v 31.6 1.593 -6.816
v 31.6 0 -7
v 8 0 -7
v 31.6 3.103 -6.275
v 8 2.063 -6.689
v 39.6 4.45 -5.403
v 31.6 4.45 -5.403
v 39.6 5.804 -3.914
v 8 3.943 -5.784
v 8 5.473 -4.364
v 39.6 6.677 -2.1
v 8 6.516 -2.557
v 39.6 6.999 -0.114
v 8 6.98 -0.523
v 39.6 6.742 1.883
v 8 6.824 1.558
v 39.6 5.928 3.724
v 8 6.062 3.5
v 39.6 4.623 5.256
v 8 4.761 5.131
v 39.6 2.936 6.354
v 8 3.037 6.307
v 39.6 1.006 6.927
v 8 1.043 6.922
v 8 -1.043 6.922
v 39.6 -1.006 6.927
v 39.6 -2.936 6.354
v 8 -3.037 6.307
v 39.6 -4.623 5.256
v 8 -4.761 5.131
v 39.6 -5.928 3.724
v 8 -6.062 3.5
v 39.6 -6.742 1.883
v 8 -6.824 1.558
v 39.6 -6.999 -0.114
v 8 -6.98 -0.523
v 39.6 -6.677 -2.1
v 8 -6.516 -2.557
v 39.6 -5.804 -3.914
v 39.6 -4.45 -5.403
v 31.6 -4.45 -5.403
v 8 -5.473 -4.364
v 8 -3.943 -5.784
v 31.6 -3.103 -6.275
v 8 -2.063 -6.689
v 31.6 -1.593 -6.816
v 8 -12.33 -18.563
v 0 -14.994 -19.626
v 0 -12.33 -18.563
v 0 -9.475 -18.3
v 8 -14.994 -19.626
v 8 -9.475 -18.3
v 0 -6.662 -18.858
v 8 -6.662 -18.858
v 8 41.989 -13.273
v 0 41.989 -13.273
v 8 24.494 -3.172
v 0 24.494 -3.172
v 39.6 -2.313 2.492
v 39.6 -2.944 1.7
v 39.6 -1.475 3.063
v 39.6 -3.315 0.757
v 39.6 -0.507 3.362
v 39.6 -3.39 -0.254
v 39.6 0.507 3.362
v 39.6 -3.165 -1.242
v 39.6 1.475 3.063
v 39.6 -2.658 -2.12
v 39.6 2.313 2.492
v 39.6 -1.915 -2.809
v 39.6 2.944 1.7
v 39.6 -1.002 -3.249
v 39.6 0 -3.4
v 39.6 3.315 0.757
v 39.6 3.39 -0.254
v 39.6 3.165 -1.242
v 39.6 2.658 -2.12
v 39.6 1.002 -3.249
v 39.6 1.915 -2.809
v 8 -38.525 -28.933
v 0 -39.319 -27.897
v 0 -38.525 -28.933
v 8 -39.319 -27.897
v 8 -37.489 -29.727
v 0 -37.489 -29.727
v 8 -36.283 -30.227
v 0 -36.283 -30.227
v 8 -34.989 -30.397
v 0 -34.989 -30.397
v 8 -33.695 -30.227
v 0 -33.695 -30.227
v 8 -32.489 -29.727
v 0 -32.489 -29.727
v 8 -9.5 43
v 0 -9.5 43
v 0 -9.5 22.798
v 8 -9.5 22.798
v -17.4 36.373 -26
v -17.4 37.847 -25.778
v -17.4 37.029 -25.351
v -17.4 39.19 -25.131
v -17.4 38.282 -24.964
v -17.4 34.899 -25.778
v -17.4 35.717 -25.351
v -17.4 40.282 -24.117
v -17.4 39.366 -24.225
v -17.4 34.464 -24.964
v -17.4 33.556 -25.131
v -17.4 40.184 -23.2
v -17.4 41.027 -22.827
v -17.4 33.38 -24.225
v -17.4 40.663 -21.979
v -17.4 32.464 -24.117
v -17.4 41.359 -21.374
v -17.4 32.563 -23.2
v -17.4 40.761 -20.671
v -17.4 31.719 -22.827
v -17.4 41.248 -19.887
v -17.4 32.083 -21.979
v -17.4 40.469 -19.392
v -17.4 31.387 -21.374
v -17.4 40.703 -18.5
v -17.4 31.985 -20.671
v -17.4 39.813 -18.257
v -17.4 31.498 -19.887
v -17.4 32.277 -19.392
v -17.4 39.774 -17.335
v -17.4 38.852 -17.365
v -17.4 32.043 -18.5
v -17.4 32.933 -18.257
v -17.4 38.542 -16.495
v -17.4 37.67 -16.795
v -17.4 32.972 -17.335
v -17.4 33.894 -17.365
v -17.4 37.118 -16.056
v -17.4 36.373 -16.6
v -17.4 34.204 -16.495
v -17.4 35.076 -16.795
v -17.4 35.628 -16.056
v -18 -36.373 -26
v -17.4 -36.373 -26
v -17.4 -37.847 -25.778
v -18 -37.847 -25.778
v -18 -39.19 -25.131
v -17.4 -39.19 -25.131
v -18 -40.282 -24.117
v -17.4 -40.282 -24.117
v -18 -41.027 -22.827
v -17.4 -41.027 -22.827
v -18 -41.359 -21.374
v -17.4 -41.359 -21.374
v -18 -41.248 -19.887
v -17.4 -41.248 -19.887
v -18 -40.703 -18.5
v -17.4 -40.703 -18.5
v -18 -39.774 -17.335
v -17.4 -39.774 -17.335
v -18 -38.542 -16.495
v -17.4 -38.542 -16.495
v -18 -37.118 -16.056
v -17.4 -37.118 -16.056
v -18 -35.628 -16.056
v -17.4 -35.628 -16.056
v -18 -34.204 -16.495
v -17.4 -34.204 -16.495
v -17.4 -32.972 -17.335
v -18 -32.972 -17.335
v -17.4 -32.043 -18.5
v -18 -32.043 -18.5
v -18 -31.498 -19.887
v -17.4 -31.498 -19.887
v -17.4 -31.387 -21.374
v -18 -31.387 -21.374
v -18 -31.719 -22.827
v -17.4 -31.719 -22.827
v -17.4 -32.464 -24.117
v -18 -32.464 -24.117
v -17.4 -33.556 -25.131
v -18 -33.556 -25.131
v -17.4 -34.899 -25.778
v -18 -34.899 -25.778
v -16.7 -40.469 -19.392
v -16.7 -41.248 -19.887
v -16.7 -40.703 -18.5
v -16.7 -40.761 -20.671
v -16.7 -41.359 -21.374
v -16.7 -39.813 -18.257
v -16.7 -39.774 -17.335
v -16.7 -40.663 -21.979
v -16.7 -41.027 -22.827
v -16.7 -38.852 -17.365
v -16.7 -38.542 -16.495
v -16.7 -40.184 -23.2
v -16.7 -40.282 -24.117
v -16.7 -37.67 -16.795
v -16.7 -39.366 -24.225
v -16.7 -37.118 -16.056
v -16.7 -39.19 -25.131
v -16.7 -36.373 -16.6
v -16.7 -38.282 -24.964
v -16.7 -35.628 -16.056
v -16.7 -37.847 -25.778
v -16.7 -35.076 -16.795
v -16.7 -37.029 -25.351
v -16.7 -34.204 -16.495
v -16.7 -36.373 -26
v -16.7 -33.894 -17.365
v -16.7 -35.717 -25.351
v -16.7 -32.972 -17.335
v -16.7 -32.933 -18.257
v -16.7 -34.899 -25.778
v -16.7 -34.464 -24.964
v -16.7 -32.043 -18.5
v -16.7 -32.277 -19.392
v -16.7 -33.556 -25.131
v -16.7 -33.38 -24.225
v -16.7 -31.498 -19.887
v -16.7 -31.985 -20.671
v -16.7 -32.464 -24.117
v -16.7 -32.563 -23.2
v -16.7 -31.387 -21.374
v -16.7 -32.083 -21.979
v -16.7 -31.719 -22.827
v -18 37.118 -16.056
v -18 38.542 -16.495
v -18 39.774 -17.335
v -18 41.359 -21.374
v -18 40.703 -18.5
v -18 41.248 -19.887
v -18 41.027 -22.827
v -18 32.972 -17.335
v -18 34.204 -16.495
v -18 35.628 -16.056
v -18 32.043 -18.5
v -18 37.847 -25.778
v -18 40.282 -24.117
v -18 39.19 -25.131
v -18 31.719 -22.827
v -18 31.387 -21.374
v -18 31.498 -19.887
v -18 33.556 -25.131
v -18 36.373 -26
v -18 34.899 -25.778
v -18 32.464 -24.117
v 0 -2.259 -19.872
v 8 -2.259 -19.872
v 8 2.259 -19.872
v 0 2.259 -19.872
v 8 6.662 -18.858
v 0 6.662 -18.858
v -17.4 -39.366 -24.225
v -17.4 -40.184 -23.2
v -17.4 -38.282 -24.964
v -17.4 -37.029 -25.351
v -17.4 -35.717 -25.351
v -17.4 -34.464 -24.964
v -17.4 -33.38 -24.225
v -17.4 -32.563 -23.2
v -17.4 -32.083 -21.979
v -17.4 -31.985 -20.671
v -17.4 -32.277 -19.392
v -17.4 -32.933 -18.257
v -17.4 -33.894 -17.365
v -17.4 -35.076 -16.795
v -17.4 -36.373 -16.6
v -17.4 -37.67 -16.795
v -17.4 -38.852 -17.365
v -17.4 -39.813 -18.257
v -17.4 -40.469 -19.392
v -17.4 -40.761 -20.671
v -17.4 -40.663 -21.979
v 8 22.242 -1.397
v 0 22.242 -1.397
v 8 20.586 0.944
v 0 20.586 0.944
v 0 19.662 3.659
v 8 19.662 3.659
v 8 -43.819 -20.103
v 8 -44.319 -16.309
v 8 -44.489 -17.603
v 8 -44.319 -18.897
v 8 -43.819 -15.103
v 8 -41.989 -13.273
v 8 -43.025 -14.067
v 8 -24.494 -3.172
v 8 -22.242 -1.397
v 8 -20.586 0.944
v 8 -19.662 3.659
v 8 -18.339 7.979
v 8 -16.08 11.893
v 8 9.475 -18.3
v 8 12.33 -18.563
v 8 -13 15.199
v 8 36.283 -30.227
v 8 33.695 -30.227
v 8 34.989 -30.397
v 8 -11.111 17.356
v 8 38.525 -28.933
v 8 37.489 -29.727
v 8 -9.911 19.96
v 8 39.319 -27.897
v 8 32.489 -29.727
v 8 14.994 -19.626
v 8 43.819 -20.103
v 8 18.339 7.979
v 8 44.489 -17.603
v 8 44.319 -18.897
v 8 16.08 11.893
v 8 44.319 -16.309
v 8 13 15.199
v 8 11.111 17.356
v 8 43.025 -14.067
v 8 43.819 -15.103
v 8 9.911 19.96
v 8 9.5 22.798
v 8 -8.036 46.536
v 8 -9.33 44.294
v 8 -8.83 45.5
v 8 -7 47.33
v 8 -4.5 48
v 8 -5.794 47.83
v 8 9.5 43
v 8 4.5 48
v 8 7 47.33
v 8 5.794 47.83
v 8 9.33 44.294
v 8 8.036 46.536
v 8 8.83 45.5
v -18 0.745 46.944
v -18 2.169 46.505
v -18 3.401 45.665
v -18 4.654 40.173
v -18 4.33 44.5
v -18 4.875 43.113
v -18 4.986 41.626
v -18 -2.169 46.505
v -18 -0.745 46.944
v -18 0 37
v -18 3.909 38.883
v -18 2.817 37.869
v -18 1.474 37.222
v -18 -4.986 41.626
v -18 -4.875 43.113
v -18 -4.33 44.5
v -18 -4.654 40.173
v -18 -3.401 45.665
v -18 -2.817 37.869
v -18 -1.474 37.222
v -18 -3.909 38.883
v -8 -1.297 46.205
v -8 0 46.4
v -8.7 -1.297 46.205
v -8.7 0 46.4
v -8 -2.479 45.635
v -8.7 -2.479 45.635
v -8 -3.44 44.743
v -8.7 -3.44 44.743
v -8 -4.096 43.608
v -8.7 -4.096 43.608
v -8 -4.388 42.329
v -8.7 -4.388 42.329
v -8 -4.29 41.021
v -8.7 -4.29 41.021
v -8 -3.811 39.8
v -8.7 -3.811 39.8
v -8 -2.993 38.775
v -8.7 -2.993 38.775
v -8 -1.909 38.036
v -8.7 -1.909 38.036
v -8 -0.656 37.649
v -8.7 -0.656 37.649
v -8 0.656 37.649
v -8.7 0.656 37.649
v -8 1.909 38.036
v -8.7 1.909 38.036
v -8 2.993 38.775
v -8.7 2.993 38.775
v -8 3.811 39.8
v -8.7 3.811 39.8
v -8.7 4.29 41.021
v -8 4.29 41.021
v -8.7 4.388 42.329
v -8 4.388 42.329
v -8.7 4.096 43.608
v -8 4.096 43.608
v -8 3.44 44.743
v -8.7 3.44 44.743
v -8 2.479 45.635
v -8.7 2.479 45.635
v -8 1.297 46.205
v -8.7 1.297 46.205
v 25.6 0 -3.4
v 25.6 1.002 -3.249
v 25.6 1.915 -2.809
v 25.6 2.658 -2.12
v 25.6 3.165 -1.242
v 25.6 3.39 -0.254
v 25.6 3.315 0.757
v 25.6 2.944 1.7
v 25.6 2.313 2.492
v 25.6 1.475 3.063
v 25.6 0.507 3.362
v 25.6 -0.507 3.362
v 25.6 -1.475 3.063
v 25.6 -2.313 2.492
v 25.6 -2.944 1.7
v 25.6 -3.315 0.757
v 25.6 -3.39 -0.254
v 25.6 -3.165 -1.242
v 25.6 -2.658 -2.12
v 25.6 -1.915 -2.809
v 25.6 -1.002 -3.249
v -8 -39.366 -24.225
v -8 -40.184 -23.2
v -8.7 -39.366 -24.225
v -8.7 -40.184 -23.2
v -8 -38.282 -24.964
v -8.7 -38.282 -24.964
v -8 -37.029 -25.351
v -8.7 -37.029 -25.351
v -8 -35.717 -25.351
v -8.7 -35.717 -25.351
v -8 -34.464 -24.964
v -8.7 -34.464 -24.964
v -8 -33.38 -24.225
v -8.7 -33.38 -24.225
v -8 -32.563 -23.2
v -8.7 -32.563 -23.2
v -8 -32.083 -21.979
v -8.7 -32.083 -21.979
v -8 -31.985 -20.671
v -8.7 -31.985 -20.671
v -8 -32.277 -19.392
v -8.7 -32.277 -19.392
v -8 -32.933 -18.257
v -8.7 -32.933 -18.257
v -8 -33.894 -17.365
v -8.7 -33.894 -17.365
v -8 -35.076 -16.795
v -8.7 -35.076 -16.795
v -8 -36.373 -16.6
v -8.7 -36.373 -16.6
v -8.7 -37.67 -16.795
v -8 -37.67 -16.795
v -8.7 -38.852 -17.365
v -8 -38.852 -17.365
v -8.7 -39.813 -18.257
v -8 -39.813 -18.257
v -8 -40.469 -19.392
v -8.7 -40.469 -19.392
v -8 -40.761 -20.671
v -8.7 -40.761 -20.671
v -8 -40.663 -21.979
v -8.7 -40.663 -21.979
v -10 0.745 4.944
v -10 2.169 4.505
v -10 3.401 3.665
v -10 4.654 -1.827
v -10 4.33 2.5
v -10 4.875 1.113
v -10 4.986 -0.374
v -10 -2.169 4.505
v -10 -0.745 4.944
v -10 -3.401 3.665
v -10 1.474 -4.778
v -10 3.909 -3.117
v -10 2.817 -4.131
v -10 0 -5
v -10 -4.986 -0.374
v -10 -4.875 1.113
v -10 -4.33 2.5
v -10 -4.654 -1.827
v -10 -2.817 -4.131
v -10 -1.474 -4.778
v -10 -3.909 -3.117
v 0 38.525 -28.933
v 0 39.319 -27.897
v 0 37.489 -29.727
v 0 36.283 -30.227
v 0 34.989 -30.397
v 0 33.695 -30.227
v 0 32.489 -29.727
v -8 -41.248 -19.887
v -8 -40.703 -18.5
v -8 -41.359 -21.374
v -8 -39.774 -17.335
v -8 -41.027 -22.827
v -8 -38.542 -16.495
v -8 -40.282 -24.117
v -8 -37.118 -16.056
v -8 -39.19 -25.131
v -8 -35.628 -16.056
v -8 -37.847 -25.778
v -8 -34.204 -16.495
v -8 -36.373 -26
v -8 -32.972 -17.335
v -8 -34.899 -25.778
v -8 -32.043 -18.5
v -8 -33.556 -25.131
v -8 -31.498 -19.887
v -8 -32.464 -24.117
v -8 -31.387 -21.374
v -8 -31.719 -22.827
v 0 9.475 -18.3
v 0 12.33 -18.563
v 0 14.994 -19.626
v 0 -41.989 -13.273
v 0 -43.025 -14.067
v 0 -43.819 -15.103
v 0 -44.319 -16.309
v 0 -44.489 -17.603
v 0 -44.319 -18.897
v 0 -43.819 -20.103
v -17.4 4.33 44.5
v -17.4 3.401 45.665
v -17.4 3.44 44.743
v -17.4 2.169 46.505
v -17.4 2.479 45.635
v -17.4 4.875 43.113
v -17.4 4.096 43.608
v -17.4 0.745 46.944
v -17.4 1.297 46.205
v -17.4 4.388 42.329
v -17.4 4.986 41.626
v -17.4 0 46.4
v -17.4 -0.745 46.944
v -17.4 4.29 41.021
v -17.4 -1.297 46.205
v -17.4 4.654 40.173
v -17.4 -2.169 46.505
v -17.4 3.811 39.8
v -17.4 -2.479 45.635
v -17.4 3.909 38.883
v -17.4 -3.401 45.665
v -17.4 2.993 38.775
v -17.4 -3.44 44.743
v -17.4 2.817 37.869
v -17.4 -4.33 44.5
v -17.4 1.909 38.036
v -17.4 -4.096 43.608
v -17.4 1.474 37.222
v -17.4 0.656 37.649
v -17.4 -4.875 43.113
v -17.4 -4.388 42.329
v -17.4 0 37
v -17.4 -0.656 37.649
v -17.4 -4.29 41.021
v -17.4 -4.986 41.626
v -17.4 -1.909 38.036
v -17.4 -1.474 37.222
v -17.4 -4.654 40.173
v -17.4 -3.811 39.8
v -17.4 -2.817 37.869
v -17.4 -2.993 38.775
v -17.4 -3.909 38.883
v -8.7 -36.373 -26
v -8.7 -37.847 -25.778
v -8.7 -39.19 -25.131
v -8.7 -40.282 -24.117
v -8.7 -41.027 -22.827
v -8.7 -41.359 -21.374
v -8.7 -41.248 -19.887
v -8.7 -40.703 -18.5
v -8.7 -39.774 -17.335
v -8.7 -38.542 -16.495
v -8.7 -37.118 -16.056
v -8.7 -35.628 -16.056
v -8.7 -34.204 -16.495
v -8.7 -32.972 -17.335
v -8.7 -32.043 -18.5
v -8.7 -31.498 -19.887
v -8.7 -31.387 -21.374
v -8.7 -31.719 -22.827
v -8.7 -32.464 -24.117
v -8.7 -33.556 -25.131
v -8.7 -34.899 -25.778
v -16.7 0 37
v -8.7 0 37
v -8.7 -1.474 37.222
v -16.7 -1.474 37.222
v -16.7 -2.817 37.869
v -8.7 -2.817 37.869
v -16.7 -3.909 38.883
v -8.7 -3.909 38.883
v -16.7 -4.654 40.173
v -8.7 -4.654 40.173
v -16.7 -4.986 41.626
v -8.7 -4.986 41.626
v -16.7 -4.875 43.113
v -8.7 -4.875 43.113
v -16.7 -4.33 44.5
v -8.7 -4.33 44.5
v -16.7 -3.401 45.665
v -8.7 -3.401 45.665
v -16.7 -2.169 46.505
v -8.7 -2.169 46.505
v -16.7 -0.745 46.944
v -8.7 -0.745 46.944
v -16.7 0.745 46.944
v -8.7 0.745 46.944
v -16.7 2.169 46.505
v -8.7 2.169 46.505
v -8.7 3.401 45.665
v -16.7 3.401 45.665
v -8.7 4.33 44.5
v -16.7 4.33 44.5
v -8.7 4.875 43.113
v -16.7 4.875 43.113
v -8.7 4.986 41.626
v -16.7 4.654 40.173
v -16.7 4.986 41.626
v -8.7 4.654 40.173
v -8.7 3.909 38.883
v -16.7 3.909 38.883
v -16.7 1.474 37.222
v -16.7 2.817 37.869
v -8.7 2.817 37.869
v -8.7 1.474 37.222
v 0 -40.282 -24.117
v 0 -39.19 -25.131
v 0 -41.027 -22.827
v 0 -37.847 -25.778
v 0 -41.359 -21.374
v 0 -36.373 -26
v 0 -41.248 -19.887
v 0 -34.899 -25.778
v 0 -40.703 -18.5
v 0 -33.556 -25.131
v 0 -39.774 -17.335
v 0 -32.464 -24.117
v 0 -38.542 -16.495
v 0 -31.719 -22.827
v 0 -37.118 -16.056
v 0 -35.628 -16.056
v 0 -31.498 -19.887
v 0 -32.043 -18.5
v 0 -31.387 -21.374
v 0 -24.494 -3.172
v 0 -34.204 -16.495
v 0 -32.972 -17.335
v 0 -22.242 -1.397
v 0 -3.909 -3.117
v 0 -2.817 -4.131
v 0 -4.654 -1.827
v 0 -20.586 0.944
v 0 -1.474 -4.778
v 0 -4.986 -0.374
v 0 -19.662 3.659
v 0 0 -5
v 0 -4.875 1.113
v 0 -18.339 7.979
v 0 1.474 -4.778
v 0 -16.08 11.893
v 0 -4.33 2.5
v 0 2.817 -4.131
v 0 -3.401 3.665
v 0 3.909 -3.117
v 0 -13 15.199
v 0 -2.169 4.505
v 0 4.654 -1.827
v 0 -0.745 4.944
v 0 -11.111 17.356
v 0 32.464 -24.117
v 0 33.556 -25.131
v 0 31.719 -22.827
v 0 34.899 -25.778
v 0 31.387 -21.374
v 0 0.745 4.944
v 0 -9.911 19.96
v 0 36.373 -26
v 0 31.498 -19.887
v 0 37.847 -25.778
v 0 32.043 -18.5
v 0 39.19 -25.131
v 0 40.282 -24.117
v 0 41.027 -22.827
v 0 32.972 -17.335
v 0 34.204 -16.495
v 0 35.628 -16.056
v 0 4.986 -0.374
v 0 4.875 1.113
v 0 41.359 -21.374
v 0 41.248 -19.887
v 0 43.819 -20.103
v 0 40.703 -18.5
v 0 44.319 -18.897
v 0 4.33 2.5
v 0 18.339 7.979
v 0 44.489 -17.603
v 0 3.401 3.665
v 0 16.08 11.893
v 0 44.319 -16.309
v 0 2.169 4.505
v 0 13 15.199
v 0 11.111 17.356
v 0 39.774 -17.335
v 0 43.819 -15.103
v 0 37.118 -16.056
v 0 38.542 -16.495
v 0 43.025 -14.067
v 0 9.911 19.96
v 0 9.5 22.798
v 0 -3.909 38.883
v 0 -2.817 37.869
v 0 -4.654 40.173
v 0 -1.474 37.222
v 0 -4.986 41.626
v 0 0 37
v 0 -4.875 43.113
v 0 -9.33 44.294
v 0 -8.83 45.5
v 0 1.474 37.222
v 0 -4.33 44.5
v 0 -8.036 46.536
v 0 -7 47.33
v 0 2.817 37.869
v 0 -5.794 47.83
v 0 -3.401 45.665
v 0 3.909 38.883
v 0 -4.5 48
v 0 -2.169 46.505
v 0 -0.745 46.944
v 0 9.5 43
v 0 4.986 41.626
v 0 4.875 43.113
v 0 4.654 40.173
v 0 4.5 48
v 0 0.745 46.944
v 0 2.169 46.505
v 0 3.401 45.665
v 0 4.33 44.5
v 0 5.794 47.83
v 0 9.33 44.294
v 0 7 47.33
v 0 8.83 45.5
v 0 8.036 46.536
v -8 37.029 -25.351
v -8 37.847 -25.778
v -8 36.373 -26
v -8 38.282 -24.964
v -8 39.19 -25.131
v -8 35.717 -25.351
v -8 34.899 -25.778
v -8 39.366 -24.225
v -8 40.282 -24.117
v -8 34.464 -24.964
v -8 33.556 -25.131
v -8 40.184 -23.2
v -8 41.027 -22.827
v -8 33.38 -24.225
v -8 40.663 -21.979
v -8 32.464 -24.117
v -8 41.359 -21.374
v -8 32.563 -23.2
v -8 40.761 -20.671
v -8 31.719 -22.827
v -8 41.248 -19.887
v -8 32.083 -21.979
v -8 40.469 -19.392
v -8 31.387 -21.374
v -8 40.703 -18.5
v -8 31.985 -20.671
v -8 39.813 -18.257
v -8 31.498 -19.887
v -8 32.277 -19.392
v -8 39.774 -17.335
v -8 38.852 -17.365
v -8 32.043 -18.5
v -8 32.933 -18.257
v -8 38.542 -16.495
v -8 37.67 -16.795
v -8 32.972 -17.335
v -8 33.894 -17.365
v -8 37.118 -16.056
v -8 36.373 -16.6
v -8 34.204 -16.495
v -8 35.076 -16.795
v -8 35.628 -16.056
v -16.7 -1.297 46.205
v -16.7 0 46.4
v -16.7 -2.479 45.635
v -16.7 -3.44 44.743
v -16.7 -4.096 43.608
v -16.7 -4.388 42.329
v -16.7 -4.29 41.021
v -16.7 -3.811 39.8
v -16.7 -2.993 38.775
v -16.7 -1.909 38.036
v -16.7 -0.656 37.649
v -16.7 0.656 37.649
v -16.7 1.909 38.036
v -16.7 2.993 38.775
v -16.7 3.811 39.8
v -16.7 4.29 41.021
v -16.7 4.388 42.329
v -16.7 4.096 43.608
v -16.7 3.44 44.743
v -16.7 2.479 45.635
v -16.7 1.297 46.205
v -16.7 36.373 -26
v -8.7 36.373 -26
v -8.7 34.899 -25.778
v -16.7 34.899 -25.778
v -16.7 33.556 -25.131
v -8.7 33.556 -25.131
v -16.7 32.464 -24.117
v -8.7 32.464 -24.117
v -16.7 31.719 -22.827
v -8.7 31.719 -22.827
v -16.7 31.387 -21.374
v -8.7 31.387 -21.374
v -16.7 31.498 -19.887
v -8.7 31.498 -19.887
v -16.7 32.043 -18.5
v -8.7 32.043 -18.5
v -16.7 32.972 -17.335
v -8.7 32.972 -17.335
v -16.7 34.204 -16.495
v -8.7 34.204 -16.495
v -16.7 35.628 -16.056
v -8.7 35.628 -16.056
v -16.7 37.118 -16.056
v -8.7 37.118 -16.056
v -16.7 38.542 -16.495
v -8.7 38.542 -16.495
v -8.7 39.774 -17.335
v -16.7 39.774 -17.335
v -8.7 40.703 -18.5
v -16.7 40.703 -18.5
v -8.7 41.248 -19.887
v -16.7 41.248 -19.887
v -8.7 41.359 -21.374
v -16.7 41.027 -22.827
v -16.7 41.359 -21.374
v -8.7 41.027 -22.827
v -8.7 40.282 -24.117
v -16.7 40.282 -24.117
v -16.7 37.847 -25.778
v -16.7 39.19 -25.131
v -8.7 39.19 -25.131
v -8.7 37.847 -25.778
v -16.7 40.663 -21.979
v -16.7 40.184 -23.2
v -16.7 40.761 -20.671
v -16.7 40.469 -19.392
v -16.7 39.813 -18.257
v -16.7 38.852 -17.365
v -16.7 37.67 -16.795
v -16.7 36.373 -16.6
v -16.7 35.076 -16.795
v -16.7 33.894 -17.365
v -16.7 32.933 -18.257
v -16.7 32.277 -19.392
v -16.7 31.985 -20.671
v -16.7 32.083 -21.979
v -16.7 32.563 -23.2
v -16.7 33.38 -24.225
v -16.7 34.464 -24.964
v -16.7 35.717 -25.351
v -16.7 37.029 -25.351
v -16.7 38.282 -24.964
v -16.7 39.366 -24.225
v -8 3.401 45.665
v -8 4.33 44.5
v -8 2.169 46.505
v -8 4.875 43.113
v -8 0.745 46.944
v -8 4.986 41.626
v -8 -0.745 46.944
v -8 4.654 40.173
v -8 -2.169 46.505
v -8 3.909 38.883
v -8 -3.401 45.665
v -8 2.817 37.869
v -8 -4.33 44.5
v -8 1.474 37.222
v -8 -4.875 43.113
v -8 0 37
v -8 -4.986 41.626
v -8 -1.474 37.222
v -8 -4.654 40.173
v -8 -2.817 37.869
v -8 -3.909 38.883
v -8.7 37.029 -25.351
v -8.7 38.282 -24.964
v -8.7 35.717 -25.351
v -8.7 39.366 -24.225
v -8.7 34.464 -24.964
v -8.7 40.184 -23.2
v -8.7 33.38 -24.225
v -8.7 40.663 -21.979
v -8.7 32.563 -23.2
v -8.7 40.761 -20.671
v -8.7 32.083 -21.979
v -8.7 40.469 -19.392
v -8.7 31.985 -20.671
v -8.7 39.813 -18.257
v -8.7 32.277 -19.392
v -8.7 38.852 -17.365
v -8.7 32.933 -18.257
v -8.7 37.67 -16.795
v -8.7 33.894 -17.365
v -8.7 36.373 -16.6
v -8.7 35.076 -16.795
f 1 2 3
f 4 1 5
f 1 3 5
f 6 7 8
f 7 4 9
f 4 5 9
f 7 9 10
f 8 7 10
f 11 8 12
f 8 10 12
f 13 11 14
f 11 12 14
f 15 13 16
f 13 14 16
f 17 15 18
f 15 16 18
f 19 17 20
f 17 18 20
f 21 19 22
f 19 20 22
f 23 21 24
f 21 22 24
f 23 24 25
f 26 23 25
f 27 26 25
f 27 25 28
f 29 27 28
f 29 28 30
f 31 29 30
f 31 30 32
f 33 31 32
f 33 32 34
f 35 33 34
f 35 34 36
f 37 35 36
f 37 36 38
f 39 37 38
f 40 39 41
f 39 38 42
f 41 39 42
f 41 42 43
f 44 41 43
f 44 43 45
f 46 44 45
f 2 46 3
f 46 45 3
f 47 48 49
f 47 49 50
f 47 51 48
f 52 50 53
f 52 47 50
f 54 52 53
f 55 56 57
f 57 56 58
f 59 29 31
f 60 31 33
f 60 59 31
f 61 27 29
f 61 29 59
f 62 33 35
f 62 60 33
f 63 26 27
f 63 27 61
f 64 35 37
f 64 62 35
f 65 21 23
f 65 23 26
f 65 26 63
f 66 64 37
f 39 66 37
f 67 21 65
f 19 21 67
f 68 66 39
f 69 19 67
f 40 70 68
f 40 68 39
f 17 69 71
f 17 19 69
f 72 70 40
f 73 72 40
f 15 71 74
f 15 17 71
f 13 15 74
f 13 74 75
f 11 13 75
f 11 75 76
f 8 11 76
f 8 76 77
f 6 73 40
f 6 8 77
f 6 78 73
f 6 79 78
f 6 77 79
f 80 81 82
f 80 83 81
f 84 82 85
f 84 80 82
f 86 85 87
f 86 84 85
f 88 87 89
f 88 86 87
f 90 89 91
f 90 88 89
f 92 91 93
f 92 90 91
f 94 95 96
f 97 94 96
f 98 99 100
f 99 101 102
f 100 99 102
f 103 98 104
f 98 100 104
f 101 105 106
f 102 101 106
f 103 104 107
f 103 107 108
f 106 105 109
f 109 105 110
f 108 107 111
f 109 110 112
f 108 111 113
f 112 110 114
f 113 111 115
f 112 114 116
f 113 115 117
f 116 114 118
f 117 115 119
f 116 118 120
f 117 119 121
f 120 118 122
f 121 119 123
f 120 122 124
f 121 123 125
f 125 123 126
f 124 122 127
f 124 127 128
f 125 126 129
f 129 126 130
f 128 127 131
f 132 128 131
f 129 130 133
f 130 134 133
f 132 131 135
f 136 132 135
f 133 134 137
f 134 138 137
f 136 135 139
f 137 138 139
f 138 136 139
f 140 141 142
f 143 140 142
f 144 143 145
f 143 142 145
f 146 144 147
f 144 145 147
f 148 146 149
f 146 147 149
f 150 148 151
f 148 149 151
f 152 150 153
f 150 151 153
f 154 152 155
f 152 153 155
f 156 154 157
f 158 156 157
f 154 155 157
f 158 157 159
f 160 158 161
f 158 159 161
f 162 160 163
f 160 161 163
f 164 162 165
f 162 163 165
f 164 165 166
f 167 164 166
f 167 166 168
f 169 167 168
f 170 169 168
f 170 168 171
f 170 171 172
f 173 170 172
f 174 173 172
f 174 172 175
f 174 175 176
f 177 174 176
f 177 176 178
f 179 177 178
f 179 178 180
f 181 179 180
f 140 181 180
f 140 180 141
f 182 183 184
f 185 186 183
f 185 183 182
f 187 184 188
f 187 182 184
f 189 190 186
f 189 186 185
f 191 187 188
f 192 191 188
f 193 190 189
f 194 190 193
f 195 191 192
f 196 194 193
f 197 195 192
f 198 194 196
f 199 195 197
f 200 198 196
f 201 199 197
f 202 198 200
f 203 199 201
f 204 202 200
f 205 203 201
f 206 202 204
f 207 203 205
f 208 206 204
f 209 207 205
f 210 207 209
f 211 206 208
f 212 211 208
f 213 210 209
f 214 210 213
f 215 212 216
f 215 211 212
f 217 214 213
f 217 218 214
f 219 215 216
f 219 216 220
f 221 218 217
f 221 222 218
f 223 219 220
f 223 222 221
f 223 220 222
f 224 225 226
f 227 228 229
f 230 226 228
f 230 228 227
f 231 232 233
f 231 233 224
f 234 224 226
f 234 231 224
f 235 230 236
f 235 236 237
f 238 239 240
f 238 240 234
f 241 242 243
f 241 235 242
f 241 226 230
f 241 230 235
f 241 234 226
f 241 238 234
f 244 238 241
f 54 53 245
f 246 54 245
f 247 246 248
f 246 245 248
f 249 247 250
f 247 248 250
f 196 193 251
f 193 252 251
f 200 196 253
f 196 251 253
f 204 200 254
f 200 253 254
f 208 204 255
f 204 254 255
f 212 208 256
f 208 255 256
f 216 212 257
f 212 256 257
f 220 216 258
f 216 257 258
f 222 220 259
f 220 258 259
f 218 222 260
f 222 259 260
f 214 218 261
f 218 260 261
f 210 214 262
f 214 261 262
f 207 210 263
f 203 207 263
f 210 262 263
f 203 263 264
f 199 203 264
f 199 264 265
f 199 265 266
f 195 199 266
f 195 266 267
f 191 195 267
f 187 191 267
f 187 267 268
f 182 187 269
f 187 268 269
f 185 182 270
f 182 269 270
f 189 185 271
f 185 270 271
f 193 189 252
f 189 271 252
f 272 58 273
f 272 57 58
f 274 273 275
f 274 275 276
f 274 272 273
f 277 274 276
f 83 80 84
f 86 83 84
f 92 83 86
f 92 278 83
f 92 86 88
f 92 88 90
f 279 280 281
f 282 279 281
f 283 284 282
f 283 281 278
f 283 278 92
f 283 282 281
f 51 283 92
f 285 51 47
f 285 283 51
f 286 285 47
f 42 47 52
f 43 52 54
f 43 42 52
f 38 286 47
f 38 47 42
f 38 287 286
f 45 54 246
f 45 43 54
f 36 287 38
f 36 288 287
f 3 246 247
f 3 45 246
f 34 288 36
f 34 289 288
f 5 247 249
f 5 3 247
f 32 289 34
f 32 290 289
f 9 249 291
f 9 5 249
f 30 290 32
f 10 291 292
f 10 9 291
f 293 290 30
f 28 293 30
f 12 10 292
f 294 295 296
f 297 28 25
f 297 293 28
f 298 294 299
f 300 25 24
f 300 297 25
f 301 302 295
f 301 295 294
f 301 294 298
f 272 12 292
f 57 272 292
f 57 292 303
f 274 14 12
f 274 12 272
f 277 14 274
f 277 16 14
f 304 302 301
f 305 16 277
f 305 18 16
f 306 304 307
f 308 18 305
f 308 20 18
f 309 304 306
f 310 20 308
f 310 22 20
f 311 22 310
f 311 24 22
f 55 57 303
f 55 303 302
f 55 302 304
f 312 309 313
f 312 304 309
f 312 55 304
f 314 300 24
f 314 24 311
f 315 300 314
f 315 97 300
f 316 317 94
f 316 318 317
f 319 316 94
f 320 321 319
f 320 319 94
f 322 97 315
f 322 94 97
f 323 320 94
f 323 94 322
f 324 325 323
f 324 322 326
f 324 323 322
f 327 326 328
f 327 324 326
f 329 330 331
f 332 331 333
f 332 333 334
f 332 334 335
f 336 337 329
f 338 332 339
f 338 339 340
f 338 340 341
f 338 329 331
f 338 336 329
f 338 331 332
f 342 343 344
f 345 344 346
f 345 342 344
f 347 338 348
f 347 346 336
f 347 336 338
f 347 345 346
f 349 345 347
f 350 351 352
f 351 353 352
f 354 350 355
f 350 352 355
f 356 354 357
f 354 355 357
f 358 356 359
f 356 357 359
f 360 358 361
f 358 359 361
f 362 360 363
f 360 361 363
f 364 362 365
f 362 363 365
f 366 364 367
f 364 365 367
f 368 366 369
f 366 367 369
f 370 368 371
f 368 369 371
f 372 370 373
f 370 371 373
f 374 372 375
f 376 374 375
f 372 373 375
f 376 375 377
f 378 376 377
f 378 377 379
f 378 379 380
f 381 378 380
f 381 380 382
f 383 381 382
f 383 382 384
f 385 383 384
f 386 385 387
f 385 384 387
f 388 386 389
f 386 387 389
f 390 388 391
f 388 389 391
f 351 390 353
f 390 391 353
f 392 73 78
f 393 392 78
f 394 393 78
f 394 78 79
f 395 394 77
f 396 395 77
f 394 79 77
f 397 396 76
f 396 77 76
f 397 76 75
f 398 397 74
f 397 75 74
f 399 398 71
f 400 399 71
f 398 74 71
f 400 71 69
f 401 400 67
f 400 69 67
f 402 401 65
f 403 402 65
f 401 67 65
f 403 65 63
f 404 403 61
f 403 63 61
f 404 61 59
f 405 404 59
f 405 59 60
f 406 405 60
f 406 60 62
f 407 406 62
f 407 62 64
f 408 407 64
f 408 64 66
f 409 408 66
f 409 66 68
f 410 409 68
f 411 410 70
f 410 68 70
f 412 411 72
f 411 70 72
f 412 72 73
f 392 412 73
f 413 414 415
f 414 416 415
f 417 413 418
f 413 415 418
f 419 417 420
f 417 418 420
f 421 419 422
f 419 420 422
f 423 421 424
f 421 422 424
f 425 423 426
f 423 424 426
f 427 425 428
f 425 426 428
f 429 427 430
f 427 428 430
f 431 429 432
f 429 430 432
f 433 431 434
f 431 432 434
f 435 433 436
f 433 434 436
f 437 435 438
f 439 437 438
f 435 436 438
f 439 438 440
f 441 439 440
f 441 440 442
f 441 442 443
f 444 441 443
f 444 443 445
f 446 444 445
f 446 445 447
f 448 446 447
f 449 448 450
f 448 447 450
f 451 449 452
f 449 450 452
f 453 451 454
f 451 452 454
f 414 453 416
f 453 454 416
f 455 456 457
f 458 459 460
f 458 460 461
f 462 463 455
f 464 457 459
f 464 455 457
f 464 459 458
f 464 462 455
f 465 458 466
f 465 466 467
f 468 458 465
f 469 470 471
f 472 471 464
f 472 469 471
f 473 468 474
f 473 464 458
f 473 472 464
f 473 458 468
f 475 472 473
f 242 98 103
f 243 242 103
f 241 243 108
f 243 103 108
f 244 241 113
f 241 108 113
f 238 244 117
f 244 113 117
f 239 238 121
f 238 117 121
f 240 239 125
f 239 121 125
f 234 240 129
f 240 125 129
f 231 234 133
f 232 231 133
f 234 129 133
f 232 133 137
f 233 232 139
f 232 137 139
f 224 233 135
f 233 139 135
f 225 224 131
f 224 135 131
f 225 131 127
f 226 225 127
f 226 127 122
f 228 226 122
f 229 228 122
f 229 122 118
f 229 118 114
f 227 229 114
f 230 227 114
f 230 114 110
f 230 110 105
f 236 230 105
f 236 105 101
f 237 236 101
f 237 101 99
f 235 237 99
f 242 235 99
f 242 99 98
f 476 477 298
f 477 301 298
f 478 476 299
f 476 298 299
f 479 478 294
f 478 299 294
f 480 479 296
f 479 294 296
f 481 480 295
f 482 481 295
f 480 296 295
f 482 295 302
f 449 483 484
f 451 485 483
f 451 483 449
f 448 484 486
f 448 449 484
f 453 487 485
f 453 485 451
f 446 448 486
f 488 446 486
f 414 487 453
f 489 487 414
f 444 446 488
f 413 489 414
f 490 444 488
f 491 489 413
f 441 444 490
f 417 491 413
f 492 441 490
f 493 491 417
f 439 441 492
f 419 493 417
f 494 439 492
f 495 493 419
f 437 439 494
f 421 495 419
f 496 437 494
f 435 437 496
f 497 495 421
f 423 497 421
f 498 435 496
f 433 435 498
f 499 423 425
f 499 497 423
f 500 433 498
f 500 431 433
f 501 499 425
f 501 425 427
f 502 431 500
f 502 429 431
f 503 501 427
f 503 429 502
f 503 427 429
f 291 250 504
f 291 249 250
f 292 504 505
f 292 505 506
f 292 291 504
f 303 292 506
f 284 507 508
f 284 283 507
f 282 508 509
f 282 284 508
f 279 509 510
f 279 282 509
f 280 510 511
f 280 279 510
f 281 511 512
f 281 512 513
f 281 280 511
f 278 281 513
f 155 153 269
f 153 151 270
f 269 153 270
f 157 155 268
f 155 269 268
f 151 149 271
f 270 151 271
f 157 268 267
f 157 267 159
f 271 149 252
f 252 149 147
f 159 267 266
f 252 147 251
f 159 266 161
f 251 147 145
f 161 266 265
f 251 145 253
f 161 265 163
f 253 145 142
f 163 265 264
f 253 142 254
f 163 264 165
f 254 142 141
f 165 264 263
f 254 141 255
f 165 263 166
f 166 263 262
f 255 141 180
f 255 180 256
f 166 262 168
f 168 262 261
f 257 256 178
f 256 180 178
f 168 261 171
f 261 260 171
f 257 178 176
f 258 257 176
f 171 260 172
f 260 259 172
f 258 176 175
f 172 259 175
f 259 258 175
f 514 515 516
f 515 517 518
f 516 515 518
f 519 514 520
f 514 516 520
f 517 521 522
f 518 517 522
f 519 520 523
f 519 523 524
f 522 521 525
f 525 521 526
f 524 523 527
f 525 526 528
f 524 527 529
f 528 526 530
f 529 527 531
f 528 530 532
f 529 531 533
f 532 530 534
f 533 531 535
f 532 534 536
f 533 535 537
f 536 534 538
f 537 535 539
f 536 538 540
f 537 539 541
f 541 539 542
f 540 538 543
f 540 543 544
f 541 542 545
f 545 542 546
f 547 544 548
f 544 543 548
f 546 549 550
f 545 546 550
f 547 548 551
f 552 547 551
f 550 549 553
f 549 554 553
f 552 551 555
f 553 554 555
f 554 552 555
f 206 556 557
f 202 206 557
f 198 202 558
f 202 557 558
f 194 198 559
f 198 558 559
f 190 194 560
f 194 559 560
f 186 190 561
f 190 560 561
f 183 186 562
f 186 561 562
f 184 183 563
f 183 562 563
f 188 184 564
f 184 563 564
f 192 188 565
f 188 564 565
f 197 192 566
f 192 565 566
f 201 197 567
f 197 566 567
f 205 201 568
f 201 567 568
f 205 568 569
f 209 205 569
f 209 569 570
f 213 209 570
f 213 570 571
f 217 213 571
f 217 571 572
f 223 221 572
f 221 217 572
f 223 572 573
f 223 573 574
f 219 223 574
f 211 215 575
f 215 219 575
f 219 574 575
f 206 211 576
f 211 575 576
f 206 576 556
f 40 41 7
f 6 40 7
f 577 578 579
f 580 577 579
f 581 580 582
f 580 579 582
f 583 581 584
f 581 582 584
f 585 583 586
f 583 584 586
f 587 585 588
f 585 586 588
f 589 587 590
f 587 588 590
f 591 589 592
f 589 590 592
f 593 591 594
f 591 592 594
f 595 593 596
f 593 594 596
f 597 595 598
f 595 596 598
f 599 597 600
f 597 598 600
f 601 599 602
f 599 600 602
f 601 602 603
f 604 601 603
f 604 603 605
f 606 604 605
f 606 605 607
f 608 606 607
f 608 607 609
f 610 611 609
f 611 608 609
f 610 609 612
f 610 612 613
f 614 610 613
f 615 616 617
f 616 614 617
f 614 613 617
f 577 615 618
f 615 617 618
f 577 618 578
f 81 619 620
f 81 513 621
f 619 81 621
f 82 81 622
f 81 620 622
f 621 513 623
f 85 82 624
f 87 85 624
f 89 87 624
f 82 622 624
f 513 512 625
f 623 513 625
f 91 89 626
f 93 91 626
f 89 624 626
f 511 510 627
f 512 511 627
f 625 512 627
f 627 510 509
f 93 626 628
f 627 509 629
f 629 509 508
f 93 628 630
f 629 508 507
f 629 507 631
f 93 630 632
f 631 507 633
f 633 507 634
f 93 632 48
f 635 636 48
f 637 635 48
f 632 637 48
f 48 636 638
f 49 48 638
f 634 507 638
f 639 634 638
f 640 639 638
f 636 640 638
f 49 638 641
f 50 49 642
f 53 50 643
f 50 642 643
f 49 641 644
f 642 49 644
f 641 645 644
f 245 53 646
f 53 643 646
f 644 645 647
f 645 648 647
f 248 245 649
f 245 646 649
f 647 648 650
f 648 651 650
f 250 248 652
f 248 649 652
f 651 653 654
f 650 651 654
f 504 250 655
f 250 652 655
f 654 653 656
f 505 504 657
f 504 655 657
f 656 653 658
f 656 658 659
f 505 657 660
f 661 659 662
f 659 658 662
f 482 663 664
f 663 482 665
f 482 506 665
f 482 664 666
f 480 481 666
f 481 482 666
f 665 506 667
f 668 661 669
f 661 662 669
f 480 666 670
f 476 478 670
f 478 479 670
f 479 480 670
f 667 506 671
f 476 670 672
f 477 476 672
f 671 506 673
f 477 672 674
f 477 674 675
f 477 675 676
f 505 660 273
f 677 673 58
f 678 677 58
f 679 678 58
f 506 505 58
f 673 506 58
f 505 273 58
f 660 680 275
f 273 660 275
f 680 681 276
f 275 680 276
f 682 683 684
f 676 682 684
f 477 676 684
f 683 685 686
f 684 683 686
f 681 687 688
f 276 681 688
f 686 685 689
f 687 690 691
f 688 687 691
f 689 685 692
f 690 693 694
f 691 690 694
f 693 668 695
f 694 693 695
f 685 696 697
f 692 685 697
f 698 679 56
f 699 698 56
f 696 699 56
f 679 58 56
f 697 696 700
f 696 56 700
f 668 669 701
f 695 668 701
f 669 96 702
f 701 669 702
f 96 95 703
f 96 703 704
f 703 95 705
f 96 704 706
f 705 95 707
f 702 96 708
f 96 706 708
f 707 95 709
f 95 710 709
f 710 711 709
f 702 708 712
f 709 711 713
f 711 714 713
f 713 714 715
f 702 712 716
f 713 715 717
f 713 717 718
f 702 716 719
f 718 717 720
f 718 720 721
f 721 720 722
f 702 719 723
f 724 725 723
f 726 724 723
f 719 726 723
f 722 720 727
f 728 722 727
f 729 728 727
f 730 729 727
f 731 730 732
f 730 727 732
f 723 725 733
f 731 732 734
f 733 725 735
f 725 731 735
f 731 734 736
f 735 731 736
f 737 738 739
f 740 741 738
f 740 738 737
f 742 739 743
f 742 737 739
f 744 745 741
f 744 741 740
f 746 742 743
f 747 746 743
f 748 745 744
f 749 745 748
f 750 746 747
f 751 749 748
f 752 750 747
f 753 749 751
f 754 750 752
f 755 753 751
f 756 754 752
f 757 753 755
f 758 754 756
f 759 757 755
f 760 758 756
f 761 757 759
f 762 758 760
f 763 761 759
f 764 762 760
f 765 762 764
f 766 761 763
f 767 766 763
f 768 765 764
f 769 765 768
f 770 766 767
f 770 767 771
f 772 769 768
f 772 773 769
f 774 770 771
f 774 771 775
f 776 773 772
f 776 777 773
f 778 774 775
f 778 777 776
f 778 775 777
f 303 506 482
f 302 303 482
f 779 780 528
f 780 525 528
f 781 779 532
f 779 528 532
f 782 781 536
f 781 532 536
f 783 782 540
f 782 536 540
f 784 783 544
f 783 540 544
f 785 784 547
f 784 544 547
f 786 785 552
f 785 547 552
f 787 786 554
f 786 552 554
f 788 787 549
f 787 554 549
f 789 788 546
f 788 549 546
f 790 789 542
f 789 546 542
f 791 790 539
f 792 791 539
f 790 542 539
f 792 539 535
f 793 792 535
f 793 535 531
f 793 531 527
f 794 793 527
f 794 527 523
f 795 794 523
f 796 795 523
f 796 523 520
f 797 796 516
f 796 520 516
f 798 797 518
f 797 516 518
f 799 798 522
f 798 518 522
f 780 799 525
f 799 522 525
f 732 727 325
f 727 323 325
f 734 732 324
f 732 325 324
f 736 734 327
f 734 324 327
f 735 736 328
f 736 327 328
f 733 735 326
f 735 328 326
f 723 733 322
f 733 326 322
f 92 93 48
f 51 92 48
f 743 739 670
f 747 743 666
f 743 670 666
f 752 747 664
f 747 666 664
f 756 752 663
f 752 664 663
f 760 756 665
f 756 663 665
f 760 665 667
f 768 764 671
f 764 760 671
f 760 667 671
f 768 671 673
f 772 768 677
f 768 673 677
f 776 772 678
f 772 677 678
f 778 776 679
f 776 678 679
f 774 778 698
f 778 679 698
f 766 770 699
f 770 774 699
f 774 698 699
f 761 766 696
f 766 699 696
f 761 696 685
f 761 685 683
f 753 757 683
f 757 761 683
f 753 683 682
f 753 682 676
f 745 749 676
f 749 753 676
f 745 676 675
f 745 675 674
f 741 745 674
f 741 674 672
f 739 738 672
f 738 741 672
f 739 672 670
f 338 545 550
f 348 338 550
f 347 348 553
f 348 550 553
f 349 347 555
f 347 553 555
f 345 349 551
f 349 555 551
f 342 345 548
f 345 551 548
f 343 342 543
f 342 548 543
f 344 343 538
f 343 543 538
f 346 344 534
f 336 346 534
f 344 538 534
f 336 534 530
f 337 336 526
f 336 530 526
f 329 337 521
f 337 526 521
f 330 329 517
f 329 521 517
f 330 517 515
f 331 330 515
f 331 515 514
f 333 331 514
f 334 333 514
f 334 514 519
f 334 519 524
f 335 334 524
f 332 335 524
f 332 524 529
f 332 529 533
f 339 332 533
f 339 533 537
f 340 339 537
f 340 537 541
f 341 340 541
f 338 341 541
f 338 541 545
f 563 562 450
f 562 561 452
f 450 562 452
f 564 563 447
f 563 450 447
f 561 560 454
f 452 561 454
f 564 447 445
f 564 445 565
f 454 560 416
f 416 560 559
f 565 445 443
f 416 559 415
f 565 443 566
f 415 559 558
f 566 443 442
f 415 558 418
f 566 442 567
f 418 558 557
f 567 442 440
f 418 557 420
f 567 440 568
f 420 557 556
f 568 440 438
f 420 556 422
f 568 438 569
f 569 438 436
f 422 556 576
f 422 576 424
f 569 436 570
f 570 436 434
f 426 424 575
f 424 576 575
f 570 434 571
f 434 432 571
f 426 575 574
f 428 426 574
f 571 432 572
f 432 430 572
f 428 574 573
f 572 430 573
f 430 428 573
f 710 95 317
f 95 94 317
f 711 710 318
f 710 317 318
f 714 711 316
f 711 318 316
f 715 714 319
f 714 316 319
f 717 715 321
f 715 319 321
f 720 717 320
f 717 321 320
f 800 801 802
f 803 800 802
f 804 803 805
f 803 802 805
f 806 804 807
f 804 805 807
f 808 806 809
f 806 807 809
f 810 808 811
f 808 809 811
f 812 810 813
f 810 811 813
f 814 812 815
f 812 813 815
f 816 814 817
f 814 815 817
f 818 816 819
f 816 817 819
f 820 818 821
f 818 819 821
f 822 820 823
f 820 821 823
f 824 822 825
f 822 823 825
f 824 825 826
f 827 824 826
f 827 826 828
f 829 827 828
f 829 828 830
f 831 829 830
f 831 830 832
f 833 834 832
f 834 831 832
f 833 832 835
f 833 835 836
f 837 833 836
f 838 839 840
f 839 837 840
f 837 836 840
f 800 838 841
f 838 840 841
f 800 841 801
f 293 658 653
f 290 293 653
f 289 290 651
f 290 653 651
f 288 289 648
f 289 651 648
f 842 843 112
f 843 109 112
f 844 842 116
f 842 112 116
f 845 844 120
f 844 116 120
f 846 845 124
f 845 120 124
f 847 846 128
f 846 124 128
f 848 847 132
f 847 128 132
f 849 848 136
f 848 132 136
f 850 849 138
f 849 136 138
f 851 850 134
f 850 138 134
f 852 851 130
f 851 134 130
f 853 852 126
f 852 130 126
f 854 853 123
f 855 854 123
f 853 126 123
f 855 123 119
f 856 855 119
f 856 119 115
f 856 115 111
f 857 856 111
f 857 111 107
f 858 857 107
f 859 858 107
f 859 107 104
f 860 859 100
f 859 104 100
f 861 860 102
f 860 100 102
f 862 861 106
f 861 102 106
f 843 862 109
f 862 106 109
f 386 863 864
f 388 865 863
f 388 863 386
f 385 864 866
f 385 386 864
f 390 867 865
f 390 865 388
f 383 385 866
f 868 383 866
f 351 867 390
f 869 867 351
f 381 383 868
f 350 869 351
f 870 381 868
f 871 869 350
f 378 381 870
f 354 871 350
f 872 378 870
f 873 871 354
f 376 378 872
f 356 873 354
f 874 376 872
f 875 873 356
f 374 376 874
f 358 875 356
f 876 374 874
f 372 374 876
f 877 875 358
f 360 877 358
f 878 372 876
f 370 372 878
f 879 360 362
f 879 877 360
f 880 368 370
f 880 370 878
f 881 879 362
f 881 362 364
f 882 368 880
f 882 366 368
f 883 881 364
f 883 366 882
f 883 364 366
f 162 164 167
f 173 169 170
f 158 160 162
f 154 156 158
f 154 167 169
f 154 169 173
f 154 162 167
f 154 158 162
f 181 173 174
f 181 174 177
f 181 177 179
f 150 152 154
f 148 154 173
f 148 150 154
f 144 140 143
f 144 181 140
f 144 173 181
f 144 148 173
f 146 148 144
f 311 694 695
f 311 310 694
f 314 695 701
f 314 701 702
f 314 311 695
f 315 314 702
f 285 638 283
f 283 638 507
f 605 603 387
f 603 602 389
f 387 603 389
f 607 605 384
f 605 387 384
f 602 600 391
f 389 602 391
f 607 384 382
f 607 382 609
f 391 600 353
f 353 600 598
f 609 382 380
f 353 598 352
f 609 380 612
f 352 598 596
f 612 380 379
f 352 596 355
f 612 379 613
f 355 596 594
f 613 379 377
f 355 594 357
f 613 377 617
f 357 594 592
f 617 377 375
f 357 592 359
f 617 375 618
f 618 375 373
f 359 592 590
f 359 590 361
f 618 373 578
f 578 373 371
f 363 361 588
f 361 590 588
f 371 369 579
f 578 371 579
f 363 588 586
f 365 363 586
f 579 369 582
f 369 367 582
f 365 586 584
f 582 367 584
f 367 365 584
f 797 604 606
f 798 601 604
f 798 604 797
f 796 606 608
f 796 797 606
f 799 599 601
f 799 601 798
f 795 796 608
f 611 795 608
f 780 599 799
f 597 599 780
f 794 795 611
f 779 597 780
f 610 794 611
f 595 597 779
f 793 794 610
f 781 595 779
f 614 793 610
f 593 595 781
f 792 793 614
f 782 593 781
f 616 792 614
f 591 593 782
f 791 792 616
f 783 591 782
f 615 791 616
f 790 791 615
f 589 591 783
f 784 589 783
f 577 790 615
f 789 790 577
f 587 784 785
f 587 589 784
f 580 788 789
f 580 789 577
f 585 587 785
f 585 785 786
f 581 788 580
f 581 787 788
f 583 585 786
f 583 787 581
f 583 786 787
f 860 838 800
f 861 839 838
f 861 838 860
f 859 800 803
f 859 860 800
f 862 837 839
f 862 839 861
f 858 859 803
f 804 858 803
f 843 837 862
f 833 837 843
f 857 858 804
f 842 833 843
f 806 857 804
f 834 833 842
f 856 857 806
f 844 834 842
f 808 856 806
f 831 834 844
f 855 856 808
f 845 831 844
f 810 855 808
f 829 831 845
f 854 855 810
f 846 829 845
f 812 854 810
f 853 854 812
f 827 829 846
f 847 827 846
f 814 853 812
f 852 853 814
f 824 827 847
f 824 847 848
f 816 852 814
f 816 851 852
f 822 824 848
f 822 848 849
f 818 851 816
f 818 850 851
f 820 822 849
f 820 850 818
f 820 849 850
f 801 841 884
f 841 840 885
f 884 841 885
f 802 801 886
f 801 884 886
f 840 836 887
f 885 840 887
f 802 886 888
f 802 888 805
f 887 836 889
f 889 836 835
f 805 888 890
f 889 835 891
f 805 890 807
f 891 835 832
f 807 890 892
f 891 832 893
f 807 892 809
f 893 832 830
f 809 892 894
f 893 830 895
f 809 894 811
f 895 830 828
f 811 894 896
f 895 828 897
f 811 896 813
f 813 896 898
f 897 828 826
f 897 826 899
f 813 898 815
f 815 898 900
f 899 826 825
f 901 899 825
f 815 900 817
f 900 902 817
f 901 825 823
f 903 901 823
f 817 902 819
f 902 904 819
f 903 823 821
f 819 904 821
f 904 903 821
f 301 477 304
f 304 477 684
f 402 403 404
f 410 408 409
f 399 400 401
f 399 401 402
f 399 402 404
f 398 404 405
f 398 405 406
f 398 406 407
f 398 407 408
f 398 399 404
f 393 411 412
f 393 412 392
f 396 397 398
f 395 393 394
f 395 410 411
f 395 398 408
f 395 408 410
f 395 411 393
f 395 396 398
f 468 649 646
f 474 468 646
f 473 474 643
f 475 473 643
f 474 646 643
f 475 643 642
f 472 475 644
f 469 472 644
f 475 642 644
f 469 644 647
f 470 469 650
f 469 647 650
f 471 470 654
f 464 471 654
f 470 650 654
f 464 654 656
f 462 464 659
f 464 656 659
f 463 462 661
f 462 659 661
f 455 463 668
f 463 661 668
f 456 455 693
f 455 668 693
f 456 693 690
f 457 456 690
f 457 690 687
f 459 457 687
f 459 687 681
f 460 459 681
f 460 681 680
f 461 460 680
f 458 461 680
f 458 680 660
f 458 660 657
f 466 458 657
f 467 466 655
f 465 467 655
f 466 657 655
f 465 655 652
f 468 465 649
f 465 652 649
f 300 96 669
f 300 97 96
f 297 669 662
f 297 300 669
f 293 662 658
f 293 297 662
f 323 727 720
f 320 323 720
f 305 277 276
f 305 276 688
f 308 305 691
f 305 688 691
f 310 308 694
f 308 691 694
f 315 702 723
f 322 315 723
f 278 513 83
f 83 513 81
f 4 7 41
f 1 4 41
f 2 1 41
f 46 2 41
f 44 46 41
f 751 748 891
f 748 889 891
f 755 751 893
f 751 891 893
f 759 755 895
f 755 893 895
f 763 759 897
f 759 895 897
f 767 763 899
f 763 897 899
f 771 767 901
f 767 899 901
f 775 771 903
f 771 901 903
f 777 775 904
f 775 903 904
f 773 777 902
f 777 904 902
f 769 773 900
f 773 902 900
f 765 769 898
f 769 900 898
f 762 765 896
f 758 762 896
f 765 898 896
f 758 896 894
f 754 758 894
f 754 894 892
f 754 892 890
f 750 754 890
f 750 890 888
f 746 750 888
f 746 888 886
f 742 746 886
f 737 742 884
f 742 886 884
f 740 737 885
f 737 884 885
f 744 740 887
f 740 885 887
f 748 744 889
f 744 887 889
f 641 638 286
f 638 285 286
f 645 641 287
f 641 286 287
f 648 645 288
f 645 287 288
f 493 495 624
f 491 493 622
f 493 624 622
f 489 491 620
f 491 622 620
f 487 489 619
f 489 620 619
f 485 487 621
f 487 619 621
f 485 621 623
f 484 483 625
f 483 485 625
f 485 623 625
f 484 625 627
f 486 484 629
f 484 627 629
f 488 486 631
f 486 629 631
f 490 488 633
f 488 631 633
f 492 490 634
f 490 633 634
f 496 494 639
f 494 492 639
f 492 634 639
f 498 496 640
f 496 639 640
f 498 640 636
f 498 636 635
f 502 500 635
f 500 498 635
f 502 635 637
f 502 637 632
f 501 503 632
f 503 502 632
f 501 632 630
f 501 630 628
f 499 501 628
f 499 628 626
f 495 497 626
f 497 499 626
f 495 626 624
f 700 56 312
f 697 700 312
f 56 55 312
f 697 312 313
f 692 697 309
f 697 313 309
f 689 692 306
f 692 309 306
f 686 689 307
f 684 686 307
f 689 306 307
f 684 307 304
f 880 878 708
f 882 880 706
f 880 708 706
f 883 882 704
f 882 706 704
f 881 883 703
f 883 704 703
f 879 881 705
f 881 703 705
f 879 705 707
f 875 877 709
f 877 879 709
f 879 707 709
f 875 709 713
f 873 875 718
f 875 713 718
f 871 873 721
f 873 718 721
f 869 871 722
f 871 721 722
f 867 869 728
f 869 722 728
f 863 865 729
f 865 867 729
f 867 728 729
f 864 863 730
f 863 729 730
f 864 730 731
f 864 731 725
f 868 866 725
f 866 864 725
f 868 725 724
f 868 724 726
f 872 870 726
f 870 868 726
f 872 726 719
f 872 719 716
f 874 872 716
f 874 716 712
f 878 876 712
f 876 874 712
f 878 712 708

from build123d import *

# Parameters (mm, degrees)
BOSS_EXTRUDE2_DEPTH = 8
FILLET1_R           = 10
FILLET3_R           = 5
FILLET4_R           = 5
SKETCH3_R           = 5
BOSS_EXTRUDE3_DEPTH = 10
SKETCH2_R           = 5
BOSS_EXTRUDE4_DEPTH = 18
SKETCH4_R           = 7
BOSS_EXTRUDE5_DEPTH = 31.6
CUT_EXTRUDE1_START  = -8
CUT_EXTRUDE1_DEPTH  = 8
SKETCH7_W           = 0.7
SKETCH7_H           = 1.2
CIRPATTERN1_COUNT   = 3
SKETCH8_R           = 3.4
CUT_EXTRUDE2_DEPTH  = 14


with BuildPart() as part:
    # Sketch1 → Boss-Extrude2 (new body)
    with BuildSketch(Plane.YZ):
        with BuildLine():
            Line((-19.991801075, -0.572616617), (-46.319219382, -15.772758664))
            Line((-46.319219382, -15.772758664), (-36.819219382, -32.227241336))
            Line((-36.819219382, -32.227241336), (-10.491801075, -17.027099289))
            ThreePointArc((-10.491801075, -17.027099289), (0, -20), (10.491801075, -17.027099289))
            Line((10.491801075, -17.027099289), (36.819219382, -32.227241336))
            Line((36.819219382, -32.227241336), (46.319219382, -15.772758664))
            Line((46.319219382, -15.772758664), (19.991801075, -0.572616617))
            ThreePointArc((19.991801075, -0.572616617), (17.320508076, 10), (9.5, 17.599715907))
            Line((9.5, 17.599715907), (9.5, 48))
            Line((9.5, 48), (-9.5, 48))
            Line((-9.5, 48), (-9.5, 17.599715907))
            ThreePointArc((-9.5, 17.599715907), (-17.320508076, 10), (-19.991801075, -0.572616617))
        make_face()
    extrude(amount=BOSS_EXTRUDE2_DEPTH)

    # Fillet1
    fillet1_edges = [part.edges().sort_by_distance(p)[0] for p in [
        (4, 9.5, 17.599715907),
        (4, 19.991801075, -0.572616617),
        (4, 10.491801075, -17.027099289),
        (4, -10.491801075, -17.027099289),
        (4, -19.991801075, -0.572616617),
        (4, -9.5, 17.599715907),
    ]]
    fillet(fillet1_edges, radius=FILLET1_R)

    # Fillet3
    fillet3_edges = [part.edges().sort_by_distance(p)[0] for p in [
        (4, -9.5, 48),
        (4, 9.5, 48),
    ]]
    fillet(fillet3_edges, radius=FILLET3_R)

    # Fillet4
    fillet4_edges = [part.edges().sort_by_distance(p)[0] for p in [
        (4, 46.319219382, -15.772758664),
        (4, 36.819219382, -32.227241336),
        (4, -36.819219382, -32.227241336),
        (4, -46.319219382, -15.772758664),
    ]]
    fillet(fillet4_edges, radius=FILLET4_R)

    # Sketch3 → Boss-Extrude3 (add)
    with BuildSketch(Plane(origin=(0, 0, 0), x_dir=(0, -1, 0), z_dir=(-1, 0, 0))):
        with Locations(Location((0, 0, 0), (0, 0, 270))):
            Circle(SKETCH3_R)
    extrude(amount=BOSS_EXTRUDE3_DEPTH)

    # Sketch2 → Boss-Extrude4 (add)
    with BuildSketch(Plane(origin=(0, 0, 0), x_dir=(0, -1, 0), z_dir=(-1, 0, 0))):
        with Locations(Location((0, 42, 0), (0, 0, 270))):
            Circle(SKETCH2_R)
        with Locations(Location((-36.373066959, -21, 0), (0, 0, 270))):
            Circle(SKETCH2_R)
        with Locations(Location((36.373066959, -21, 0), (0, 0, 270))):
            Circle(SKETCH2_R)
    extrude(amount=BOSS_EXTRUDE4_DEPTH)

    # Sketch4 → Boss-Extrude5 (add)
    with BuildSketch(Plane.YZ.offset(8)):
        with Locations(Location((0, 0, 0), (0, 0, 270))):
            Circle(SKETCH4_R)
    extrude(amount=BOSS_EXTRUDE5_DEPTH)

    # Sketch5 → Cut-Extrude1 (cut)
    with BuildSketch(Plane.YZ.offset(39.6).offset(CUT_EXTRUDE1_START)):
        with BuildLine():
            Line((-4.45, -5.403471107), (4.45, -5.403471107))
            ThreePointArc((4.45, -5.403471107), (0, -7), (-4.45, -5.403471107))
        make_face()
    extrude(amount=CUT_EXTRUDE1_DEPTH, mode=Mode.SUBTRACT)

    # Sketch7 → Cut-Revolve1 (revolve, cut)
    with BuildSketch(Plane(origin=(0, 0, 0), x_dir=(-1, 0, 0), z_dir=(0, 1, 0))):
        with Locations((8.35, 47)):
            Rectangle(SKETCH7_W, SKETCH7_H)
        with Locations((17.05, 47)):
            Rectangle(SKETCH7_W, SKETCH7_H)
    cut_revolve1 = revolve(axis=Axis((-21.815535784, 0, 42), (1, 0, 0)), mode=Mode.SUBTRACT)

    # CirPattern1: Cut-Revolve1 ×3 about axis
    cirpattern1_axis = Axis((0, 0, 0), (1, 0, 0))
    for i in range(1, CIRPATTERN1_COUNT):
        add(cut_revolve1.rotate(cirpattern1_axis, i * 360 / CIRPATTERN1_COUNT), mode=Mode.SUBTRACT)

    # Sketch8 → Cut-Extrude2 (cut)
    with BuildSketch(Plane.YZ.offset(39.6)):
        with Locations(Location((0, 0, 0), (0, 0, 270))):
            Circle(SKETCH8_R)
    extrude(amount=-CUT_EXTRUDE2_DEPTH, mode=Mode.SUBTRACT)


solid = part.part
